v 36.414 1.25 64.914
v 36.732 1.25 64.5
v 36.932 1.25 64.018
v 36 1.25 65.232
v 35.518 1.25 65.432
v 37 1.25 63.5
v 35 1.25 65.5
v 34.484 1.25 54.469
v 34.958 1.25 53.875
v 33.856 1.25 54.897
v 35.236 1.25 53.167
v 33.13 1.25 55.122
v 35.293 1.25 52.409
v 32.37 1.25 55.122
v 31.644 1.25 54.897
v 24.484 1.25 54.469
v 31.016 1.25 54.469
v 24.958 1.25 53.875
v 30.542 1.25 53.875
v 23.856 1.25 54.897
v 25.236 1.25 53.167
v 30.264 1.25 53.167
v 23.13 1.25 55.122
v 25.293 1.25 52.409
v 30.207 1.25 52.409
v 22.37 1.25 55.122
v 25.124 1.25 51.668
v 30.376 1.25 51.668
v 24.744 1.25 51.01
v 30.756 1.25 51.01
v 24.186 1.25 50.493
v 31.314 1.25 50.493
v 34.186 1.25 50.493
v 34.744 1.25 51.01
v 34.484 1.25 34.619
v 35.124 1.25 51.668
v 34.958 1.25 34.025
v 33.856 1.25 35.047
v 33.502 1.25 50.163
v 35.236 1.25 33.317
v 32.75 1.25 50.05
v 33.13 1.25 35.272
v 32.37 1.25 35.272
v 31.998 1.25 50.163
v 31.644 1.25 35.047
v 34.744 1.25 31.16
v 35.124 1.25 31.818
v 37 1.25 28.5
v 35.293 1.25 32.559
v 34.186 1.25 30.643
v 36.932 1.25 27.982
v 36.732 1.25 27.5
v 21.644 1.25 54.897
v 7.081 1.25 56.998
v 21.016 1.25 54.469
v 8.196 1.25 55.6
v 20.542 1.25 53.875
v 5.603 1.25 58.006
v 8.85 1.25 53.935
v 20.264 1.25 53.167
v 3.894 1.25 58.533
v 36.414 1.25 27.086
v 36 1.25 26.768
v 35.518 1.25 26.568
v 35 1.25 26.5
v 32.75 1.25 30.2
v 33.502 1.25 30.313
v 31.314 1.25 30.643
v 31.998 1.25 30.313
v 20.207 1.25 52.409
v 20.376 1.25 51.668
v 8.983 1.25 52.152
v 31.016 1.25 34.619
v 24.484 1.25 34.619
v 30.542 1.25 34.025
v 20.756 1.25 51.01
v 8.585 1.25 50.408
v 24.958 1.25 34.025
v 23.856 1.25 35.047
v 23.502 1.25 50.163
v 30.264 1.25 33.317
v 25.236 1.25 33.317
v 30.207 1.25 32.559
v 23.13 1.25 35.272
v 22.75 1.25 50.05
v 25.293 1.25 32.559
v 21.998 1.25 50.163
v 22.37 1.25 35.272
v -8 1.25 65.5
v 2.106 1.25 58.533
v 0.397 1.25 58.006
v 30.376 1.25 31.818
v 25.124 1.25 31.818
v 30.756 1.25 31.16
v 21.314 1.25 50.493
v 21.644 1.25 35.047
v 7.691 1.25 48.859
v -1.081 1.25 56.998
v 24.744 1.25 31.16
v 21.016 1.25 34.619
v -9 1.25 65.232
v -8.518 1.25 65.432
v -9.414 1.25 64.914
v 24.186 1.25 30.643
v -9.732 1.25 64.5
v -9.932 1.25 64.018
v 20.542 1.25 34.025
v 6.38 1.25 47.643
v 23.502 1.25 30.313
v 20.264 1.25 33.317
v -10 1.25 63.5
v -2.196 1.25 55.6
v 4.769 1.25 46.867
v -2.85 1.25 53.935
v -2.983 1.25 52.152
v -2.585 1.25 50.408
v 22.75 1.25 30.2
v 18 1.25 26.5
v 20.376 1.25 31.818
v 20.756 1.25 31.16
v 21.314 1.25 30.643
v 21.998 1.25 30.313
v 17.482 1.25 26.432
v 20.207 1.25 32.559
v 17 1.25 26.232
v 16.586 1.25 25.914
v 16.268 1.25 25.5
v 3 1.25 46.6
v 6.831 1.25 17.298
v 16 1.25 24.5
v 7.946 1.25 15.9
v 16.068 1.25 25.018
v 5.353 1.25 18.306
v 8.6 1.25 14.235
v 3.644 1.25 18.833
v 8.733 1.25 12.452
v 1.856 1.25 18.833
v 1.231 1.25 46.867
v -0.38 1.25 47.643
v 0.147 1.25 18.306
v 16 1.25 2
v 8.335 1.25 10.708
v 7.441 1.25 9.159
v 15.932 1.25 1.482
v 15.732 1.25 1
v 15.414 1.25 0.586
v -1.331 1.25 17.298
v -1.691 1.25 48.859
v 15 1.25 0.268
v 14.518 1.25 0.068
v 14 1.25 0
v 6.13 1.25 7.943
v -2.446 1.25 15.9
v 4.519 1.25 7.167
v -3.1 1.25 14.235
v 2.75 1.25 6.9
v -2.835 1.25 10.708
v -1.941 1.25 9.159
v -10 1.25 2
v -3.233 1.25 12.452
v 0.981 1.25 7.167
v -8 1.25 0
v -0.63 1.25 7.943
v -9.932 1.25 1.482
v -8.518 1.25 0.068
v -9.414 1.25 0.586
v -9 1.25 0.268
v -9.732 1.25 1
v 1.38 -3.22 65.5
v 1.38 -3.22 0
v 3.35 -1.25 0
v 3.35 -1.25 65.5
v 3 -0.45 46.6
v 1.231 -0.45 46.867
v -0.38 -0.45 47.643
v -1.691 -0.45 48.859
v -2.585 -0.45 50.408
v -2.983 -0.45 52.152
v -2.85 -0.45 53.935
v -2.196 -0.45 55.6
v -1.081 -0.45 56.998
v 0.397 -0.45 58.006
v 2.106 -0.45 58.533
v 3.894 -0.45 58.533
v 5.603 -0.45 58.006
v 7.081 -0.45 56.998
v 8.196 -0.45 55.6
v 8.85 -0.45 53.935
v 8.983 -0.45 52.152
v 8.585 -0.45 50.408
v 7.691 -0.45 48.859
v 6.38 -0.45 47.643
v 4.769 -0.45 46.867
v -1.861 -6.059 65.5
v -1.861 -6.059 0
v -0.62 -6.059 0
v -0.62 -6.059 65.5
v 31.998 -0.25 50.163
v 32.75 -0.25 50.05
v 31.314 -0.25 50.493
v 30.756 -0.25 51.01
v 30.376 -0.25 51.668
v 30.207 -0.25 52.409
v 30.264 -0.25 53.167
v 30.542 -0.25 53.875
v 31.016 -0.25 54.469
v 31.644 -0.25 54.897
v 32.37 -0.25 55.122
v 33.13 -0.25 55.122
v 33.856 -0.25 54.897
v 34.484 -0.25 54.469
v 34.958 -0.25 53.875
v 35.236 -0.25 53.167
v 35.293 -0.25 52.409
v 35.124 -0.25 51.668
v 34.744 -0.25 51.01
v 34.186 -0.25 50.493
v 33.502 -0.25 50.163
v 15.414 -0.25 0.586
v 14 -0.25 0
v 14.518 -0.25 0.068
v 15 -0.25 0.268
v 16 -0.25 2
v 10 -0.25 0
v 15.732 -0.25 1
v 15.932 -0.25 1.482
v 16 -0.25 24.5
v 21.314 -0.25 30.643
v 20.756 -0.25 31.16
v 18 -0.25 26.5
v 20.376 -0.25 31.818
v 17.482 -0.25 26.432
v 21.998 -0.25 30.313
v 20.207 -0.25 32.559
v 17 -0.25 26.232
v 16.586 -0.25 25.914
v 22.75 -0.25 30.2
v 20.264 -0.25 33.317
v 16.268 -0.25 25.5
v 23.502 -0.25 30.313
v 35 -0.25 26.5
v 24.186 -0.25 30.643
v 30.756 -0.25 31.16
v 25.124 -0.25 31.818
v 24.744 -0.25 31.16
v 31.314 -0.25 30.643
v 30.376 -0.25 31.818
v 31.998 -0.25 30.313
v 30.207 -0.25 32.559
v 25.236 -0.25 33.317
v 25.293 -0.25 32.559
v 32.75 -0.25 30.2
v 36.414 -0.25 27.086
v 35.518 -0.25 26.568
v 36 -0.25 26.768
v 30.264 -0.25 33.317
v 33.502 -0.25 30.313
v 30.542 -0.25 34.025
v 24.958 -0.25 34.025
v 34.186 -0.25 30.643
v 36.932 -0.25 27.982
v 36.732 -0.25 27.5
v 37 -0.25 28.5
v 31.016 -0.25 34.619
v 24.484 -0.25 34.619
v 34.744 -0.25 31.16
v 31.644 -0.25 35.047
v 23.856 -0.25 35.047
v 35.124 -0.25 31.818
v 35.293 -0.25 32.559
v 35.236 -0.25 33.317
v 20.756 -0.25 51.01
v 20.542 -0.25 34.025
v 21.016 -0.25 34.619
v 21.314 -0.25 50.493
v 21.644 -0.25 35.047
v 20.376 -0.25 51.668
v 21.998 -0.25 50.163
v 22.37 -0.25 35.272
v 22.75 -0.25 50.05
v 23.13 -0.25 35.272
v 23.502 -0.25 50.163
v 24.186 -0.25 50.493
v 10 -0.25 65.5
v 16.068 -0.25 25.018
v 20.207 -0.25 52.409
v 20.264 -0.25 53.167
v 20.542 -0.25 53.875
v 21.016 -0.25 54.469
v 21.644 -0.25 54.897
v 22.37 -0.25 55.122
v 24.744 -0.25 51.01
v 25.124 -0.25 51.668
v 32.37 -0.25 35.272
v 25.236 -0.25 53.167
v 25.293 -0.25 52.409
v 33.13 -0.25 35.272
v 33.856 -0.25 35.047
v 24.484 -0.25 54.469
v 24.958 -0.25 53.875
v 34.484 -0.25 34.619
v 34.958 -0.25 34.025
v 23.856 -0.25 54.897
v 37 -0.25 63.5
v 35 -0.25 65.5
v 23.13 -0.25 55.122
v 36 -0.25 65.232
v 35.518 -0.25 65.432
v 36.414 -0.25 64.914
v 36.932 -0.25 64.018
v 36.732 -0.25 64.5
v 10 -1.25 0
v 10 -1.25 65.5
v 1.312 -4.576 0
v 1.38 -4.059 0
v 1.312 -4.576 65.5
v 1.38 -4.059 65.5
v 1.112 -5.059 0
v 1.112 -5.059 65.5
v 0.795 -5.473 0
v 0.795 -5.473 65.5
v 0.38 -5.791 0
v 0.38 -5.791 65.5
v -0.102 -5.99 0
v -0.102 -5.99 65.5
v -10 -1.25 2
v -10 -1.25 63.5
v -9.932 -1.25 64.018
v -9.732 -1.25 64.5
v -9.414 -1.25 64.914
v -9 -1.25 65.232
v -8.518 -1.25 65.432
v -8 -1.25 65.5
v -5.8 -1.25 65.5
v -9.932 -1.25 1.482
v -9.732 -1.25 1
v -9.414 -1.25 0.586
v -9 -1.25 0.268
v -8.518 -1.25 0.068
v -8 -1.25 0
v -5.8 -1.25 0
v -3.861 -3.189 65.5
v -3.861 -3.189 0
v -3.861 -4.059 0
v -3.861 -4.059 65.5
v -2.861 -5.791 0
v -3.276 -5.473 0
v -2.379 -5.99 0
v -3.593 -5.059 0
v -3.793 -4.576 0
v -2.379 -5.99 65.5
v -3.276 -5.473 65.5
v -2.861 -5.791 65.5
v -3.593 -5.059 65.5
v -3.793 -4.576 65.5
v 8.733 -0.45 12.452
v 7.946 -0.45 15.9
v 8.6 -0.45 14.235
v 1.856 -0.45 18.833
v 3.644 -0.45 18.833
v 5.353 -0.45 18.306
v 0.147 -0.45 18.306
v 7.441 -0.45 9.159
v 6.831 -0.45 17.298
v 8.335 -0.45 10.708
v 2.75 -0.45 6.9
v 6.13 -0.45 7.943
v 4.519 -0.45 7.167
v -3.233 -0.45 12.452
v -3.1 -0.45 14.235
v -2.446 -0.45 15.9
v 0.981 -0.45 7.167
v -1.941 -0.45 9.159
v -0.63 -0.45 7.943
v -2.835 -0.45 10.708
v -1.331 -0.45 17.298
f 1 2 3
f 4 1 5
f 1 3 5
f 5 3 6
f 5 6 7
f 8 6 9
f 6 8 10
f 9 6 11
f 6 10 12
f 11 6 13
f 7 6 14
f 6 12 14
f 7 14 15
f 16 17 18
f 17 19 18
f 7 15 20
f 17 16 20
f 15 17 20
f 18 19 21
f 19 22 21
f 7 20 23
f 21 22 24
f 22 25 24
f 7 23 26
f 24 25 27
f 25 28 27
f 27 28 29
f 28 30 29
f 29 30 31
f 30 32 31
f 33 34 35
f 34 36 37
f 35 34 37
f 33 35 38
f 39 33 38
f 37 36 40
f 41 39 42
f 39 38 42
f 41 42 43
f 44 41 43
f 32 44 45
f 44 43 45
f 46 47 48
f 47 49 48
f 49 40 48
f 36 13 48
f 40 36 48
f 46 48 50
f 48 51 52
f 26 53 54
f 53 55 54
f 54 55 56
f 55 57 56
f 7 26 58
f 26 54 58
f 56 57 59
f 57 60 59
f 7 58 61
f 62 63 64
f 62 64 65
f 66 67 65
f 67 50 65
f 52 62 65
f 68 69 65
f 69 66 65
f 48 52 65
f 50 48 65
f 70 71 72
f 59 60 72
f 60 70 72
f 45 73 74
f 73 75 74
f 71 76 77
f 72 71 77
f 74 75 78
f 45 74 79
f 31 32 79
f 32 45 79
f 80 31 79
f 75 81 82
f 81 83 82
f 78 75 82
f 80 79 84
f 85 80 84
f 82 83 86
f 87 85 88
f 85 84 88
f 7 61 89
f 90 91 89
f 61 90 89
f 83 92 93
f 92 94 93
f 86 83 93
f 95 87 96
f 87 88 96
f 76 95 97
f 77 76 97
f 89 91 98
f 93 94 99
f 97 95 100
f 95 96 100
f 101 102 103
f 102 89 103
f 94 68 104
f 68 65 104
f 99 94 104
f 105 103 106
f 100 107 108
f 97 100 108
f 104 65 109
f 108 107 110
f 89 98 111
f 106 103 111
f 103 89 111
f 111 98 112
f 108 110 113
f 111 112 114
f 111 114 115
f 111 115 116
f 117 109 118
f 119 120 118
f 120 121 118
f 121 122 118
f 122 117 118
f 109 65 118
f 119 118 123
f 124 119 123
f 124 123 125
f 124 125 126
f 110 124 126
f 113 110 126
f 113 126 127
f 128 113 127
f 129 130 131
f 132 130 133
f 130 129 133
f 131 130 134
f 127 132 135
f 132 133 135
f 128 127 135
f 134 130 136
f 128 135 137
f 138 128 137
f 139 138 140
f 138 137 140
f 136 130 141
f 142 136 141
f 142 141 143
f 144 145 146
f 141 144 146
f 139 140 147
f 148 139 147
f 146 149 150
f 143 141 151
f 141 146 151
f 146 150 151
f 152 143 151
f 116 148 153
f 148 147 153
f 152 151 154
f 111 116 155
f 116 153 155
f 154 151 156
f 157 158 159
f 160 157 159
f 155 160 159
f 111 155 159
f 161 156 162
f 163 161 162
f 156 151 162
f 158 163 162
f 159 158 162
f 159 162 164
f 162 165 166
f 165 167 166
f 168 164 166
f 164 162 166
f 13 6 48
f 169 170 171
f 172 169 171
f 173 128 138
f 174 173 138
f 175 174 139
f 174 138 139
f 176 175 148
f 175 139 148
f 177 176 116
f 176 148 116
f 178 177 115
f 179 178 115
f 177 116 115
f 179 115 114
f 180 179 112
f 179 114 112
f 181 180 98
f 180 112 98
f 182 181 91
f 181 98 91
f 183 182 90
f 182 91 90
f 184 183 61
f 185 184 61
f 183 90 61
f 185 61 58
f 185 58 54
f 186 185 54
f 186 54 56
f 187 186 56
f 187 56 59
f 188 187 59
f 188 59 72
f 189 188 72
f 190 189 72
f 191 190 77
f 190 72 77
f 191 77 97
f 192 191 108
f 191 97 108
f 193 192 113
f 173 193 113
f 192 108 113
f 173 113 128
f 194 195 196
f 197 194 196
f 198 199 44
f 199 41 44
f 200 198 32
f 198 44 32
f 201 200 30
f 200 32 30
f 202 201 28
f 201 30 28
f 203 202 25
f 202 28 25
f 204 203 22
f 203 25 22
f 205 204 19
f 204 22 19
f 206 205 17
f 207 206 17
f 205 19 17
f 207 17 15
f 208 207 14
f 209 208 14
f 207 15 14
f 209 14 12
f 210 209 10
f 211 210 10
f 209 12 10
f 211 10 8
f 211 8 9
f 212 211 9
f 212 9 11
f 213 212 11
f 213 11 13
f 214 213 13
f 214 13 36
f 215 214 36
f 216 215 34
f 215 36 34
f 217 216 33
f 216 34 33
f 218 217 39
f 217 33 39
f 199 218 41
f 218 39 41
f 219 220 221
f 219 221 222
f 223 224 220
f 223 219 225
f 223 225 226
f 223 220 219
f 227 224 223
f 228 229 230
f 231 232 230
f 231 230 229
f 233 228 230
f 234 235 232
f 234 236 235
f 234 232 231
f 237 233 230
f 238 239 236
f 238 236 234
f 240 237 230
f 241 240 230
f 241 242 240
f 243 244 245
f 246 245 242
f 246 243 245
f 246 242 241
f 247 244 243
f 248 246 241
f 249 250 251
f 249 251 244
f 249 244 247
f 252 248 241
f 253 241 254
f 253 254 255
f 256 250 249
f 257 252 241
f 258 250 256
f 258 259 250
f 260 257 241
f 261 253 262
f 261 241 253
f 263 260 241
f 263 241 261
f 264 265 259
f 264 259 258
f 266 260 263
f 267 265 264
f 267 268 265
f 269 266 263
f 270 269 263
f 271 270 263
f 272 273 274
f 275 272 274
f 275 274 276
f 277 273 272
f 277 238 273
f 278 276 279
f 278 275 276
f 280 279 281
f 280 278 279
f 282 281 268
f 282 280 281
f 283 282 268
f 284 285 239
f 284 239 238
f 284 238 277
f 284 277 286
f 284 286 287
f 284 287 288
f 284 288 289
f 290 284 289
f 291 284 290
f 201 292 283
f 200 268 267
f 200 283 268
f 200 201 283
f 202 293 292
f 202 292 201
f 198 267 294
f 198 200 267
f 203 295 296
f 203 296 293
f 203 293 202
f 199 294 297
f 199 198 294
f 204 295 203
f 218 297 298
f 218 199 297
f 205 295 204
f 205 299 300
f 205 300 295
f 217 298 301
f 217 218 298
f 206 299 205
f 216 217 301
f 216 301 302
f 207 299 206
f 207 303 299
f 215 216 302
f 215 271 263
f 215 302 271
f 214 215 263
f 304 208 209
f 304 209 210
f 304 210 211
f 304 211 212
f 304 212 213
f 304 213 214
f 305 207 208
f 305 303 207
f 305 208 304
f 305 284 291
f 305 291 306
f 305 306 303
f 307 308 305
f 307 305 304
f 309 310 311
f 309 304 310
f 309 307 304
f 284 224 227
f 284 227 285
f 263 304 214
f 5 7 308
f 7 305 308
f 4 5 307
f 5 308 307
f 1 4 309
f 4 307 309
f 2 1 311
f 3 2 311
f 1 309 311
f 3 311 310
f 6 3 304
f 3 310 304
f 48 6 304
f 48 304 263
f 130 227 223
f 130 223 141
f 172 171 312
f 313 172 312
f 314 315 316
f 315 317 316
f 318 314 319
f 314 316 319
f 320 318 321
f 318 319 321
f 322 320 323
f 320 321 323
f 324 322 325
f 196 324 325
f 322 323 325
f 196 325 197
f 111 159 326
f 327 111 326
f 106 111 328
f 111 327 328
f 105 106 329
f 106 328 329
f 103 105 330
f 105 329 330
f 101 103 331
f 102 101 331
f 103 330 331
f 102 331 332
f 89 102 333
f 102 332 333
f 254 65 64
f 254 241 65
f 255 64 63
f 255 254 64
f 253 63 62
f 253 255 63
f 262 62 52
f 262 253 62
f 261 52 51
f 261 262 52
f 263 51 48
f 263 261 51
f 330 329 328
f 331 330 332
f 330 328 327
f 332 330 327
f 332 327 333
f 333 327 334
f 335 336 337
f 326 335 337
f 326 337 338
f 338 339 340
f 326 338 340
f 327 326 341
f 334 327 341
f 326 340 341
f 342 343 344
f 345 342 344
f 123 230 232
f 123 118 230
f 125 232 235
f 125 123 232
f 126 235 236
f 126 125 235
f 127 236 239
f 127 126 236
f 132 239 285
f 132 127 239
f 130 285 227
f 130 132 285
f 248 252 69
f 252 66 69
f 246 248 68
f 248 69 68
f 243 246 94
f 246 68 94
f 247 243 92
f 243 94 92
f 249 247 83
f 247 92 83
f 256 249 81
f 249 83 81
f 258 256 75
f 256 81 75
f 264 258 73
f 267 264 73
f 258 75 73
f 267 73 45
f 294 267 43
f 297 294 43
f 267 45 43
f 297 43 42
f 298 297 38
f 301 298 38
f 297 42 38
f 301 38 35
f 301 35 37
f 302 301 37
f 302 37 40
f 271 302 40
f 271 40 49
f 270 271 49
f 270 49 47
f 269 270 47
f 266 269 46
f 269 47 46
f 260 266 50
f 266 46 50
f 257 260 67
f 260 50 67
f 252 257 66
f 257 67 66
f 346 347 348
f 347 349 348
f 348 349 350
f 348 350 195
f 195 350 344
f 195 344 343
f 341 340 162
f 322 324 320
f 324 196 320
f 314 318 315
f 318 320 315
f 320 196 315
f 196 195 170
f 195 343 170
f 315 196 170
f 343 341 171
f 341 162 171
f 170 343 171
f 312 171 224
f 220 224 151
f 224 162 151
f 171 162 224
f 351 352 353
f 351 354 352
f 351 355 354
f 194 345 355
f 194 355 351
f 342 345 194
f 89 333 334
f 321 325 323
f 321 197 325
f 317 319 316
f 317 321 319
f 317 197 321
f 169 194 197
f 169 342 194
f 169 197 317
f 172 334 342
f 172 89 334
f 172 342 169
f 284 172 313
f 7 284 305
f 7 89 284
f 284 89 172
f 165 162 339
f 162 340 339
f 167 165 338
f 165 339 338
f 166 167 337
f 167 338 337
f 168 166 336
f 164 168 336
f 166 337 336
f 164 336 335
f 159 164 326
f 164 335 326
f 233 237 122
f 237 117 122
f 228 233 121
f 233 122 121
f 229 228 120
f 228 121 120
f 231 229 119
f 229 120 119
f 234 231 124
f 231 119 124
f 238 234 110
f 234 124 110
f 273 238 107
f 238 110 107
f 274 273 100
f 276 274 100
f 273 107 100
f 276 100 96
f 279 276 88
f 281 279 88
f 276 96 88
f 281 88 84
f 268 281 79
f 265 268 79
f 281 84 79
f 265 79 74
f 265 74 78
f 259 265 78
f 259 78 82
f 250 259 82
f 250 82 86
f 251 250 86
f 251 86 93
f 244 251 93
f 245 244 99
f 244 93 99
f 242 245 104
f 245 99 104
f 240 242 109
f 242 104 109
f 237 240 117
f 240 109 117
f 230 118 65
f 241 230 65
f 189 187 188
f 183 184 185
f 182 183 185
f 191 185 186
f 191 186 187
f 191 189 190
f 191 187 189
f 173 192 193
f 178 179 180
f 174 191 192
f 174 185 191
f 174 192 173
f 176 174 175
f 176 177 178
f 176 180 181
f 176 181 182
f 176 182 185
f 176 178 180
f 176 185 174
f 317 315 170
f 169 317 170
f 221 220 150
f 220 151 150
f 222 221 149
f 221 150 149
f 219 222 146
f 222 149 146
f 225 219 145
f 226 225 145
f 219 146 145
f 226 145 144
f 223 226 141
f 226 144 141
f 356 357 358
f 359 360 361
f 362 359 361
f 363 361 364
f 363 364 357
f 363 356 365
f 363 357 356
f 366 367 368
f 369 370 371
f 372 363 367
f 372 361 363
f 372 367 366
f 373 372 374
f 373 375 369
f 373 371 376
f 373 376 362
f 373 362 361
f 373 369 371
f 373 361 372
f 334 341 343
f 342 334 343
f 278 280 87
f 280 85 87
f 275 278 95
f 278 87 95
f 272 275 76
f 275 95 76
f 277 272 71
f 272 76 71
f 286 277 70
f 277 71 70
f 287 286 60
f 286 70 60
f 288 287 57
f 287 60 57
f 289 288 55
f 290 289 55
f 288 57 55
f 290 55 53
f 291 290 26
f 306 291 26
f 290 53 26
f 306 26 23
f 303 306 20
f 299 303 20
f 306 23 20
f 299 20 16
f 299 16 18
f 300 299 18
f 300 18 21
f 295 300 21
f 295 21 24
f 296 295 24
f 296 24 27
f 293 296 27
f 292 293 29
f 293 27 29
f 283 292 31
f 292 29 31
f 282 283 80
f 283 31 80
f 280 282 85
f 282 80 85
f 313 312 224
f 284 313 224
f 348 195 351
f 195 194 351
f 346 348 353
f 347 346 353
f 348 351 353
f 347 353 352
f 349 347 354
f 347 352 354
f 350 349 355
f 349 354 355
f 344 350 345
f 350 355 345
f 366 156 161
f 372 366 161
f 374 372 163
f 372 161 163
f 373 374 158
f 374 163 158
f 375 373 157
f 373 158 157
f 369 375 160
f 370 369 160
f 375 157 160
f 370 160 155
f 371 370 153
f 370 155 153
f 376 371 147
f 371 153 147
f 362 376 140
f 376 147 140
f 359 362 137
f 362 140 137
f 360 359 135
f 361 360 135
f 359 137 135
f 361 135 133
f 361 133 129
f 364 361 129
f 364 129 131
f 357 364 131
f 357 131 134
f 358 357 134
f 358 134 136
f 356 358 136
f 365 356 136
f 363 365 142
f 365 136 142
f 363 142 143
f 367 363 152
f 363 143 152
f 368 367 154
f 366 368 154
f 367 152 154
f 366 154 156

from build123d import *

# Parameters (mm, degrees)
BOSS_EXTRUDE1_DEPTH             = 65.5
CUT_EXTRUDE1_START              = 1.25
SKETCH2_R                       = 6
CUT_EXTRUDE1_DEPTH              = 1.7
BOSS_EXTRUDE2_REACH             = 69.698
SKETCH3_W                       = 21
SKETCH3_H                       = 39
SKETCH3_R                       = 2.55
BOSS_EXTRUDE2_DIRECTION_2_REACH = 69.698
FILLET1_R                       = 2


with BuildPart() as part:
    # Sketch1 → Boss-Extrude1 (new body)
    with BuildSketch(Plane.XY):
        Polygon((-10, -1.25), (-5.8, -1.25), (-3.861348368, -3.188651632), (-3.861348368, -6.058534431), (1.380405129, -6.058534431), (1.380405129, -3.219594871), (3.35, -1.25), (10, -1.25), (10, -0.25), (16, -0.25), (16, 1.25), (10, 1.25), (-10, 1.25), align=None)
    extrude(amount=BOSS_EXTRUDE1_DEPTH)

    # Sketch2 → Cut-Extrude1 (cut)
    with BuildSketch(Plane(origin=(0, 0, 0), x_dir=(1, 0, 0), z_dir=(0, 1, 0)).offset(CUT_EXTRUDE1_START)):
        with Locations(Location((2.75, -12.9, 0), (0, 0, 90))):
            Circle(SKETCH2_R)
        with Locations(Location((3, -52.6, 0), (0, 0, 90))):
            Circle(SKETCH2_R)
    extrude(amount=-CUT_EXTRUDE1_DEPTH, mode=Mode.SUBTRACT)

    # Boss-Extrude2: up to this face of the body (flat: up to its plane)
    boss_extrude2_end = Plane(part.part.faces().sort_by_distance((3.019145607, 1.25, 32.75))[0])
    # Sketch3 → Boss-Extrude2 (add, up to the picked face)
    with BuildSketch(Plane(origin=(0, 0, 0), x_dir=(1, 0, 0), z_dir=(0, 1, 0)), mode=Mode.PRIVATE) as boss_extrude2_sk1:
        with Locations((26.5, -46)):
            Rectangle(SKETCH3_W, SKETCH3_H)
        with Locations(Location((32.75, -52.6, 0), (0, 0, 90))):
            Circle(SKETCH3_R, mode=Mode.SUBTRACT)
        with Locations(Location((32.75, -32.75, 0), (0, 0, 90))):
            Circle(SKETCH3_R, mode=Mode.SUBTRACT)
        with Locations(Location((22.75, -52.6, 0), (0, 0, 90))):
            Circle(SKETCH3_R, mode=Mode.SUBTRACT)
        with Locations(Location((22.75, -32.75, 0), (0, 0, 90))):
            Circle(SKETCH3_R, mode=Mode.SUBTRACT)
    boss_extrude2_tool1 = split(extrude(boss_extrude2_sk1.sketch, amount=BOSS_EXTRUDE2_REACH, mode=Mode.PRIVATE), bisect_by=boss_extrude2_end, keep=Keep.BOTH, mode=Mode.PRIVATE)
    add(boss_extrude2_tool1.solids().sort_by(Axis((26.361464, 0, 46.368507), (0, 1, 0)))[0])

    # Boss-Extrude2 direction 2: up to this face of the body (flat: up to its plane)
    boss_extrude2_direction_2_end = Plane(part.part.faces().sort_by_distance((13, -0.25, 32.75))[0])
    # Sketch3 → Boss-Extrude2 direction 2 (add, up to the picked face)
    with BuildSketch(Plane(origin=(0, 0, 0), x_dir=(1, 0, 0), z_dir=(0, 1, 0)), mode=Mode.PRIVATE) as boss_extrude2_direction_2_sk1:
        with Locations((26.5, -46)):
            Rectangle(SKETCH3_W, SKETCH3_H)
        with Locations(Location((32.75, -52.6, 0), (0, 0, 90))):
            Circle(SKETCH3_R, mode=Mode.SUBTRACT)
        with Locations(Location((32.75, -32.75, 0), (0, 0, 90))):
            Circle(SKETCH3_R, mode=Mode.SUBTRACT)
        with Locations(Location((22.75, -52.6, 0), (0, 0, 90))):
            Circle(SKETCH3_R, mode=Mode.SUBTRACT)
        with Locations(Location((22.75, -32.75, 0), (0, 0, 90))):
            Circle(SKETCH3_R, mode=Mode.SUBTRACT)
    boss_extrude2_direction_2_tool1 = split(extrude(boss_extrude2_direction_2_sk1.sketch, amount=-BOSS_EXTRUDE2_DIRECTION_2_REACH, mode=Mode.PRIVATE), bisect_by=boss_extrude2_direction_2_end, keep=Keep.BOTH, mode=Mode.PRIVATE)
    add(boss_extrude2_direction_2_tool1.solids().sort_by(Axis((26.361464, 0, 46.368507), (0, -1, 0)))[0])

    # Fillet1
    fillet1_edges = [part.edges().sort_by_distance(p)[0] for p in [
        (-10, 0, 65.5),
        (16, 0.5, 0),
        (-10, 0, 0),
        (1.380405129, -6.058534431, 32.75),
        (-3.861348368, -6.058534431, 32.75),
        (37, 0.5, 65.5),
        (37, 0.5, 26.5),
        (16, 0.5, 26.5),
    ]]
    fillet(fillet1_edges, radius=FILLET1_R)


solid = part.part
